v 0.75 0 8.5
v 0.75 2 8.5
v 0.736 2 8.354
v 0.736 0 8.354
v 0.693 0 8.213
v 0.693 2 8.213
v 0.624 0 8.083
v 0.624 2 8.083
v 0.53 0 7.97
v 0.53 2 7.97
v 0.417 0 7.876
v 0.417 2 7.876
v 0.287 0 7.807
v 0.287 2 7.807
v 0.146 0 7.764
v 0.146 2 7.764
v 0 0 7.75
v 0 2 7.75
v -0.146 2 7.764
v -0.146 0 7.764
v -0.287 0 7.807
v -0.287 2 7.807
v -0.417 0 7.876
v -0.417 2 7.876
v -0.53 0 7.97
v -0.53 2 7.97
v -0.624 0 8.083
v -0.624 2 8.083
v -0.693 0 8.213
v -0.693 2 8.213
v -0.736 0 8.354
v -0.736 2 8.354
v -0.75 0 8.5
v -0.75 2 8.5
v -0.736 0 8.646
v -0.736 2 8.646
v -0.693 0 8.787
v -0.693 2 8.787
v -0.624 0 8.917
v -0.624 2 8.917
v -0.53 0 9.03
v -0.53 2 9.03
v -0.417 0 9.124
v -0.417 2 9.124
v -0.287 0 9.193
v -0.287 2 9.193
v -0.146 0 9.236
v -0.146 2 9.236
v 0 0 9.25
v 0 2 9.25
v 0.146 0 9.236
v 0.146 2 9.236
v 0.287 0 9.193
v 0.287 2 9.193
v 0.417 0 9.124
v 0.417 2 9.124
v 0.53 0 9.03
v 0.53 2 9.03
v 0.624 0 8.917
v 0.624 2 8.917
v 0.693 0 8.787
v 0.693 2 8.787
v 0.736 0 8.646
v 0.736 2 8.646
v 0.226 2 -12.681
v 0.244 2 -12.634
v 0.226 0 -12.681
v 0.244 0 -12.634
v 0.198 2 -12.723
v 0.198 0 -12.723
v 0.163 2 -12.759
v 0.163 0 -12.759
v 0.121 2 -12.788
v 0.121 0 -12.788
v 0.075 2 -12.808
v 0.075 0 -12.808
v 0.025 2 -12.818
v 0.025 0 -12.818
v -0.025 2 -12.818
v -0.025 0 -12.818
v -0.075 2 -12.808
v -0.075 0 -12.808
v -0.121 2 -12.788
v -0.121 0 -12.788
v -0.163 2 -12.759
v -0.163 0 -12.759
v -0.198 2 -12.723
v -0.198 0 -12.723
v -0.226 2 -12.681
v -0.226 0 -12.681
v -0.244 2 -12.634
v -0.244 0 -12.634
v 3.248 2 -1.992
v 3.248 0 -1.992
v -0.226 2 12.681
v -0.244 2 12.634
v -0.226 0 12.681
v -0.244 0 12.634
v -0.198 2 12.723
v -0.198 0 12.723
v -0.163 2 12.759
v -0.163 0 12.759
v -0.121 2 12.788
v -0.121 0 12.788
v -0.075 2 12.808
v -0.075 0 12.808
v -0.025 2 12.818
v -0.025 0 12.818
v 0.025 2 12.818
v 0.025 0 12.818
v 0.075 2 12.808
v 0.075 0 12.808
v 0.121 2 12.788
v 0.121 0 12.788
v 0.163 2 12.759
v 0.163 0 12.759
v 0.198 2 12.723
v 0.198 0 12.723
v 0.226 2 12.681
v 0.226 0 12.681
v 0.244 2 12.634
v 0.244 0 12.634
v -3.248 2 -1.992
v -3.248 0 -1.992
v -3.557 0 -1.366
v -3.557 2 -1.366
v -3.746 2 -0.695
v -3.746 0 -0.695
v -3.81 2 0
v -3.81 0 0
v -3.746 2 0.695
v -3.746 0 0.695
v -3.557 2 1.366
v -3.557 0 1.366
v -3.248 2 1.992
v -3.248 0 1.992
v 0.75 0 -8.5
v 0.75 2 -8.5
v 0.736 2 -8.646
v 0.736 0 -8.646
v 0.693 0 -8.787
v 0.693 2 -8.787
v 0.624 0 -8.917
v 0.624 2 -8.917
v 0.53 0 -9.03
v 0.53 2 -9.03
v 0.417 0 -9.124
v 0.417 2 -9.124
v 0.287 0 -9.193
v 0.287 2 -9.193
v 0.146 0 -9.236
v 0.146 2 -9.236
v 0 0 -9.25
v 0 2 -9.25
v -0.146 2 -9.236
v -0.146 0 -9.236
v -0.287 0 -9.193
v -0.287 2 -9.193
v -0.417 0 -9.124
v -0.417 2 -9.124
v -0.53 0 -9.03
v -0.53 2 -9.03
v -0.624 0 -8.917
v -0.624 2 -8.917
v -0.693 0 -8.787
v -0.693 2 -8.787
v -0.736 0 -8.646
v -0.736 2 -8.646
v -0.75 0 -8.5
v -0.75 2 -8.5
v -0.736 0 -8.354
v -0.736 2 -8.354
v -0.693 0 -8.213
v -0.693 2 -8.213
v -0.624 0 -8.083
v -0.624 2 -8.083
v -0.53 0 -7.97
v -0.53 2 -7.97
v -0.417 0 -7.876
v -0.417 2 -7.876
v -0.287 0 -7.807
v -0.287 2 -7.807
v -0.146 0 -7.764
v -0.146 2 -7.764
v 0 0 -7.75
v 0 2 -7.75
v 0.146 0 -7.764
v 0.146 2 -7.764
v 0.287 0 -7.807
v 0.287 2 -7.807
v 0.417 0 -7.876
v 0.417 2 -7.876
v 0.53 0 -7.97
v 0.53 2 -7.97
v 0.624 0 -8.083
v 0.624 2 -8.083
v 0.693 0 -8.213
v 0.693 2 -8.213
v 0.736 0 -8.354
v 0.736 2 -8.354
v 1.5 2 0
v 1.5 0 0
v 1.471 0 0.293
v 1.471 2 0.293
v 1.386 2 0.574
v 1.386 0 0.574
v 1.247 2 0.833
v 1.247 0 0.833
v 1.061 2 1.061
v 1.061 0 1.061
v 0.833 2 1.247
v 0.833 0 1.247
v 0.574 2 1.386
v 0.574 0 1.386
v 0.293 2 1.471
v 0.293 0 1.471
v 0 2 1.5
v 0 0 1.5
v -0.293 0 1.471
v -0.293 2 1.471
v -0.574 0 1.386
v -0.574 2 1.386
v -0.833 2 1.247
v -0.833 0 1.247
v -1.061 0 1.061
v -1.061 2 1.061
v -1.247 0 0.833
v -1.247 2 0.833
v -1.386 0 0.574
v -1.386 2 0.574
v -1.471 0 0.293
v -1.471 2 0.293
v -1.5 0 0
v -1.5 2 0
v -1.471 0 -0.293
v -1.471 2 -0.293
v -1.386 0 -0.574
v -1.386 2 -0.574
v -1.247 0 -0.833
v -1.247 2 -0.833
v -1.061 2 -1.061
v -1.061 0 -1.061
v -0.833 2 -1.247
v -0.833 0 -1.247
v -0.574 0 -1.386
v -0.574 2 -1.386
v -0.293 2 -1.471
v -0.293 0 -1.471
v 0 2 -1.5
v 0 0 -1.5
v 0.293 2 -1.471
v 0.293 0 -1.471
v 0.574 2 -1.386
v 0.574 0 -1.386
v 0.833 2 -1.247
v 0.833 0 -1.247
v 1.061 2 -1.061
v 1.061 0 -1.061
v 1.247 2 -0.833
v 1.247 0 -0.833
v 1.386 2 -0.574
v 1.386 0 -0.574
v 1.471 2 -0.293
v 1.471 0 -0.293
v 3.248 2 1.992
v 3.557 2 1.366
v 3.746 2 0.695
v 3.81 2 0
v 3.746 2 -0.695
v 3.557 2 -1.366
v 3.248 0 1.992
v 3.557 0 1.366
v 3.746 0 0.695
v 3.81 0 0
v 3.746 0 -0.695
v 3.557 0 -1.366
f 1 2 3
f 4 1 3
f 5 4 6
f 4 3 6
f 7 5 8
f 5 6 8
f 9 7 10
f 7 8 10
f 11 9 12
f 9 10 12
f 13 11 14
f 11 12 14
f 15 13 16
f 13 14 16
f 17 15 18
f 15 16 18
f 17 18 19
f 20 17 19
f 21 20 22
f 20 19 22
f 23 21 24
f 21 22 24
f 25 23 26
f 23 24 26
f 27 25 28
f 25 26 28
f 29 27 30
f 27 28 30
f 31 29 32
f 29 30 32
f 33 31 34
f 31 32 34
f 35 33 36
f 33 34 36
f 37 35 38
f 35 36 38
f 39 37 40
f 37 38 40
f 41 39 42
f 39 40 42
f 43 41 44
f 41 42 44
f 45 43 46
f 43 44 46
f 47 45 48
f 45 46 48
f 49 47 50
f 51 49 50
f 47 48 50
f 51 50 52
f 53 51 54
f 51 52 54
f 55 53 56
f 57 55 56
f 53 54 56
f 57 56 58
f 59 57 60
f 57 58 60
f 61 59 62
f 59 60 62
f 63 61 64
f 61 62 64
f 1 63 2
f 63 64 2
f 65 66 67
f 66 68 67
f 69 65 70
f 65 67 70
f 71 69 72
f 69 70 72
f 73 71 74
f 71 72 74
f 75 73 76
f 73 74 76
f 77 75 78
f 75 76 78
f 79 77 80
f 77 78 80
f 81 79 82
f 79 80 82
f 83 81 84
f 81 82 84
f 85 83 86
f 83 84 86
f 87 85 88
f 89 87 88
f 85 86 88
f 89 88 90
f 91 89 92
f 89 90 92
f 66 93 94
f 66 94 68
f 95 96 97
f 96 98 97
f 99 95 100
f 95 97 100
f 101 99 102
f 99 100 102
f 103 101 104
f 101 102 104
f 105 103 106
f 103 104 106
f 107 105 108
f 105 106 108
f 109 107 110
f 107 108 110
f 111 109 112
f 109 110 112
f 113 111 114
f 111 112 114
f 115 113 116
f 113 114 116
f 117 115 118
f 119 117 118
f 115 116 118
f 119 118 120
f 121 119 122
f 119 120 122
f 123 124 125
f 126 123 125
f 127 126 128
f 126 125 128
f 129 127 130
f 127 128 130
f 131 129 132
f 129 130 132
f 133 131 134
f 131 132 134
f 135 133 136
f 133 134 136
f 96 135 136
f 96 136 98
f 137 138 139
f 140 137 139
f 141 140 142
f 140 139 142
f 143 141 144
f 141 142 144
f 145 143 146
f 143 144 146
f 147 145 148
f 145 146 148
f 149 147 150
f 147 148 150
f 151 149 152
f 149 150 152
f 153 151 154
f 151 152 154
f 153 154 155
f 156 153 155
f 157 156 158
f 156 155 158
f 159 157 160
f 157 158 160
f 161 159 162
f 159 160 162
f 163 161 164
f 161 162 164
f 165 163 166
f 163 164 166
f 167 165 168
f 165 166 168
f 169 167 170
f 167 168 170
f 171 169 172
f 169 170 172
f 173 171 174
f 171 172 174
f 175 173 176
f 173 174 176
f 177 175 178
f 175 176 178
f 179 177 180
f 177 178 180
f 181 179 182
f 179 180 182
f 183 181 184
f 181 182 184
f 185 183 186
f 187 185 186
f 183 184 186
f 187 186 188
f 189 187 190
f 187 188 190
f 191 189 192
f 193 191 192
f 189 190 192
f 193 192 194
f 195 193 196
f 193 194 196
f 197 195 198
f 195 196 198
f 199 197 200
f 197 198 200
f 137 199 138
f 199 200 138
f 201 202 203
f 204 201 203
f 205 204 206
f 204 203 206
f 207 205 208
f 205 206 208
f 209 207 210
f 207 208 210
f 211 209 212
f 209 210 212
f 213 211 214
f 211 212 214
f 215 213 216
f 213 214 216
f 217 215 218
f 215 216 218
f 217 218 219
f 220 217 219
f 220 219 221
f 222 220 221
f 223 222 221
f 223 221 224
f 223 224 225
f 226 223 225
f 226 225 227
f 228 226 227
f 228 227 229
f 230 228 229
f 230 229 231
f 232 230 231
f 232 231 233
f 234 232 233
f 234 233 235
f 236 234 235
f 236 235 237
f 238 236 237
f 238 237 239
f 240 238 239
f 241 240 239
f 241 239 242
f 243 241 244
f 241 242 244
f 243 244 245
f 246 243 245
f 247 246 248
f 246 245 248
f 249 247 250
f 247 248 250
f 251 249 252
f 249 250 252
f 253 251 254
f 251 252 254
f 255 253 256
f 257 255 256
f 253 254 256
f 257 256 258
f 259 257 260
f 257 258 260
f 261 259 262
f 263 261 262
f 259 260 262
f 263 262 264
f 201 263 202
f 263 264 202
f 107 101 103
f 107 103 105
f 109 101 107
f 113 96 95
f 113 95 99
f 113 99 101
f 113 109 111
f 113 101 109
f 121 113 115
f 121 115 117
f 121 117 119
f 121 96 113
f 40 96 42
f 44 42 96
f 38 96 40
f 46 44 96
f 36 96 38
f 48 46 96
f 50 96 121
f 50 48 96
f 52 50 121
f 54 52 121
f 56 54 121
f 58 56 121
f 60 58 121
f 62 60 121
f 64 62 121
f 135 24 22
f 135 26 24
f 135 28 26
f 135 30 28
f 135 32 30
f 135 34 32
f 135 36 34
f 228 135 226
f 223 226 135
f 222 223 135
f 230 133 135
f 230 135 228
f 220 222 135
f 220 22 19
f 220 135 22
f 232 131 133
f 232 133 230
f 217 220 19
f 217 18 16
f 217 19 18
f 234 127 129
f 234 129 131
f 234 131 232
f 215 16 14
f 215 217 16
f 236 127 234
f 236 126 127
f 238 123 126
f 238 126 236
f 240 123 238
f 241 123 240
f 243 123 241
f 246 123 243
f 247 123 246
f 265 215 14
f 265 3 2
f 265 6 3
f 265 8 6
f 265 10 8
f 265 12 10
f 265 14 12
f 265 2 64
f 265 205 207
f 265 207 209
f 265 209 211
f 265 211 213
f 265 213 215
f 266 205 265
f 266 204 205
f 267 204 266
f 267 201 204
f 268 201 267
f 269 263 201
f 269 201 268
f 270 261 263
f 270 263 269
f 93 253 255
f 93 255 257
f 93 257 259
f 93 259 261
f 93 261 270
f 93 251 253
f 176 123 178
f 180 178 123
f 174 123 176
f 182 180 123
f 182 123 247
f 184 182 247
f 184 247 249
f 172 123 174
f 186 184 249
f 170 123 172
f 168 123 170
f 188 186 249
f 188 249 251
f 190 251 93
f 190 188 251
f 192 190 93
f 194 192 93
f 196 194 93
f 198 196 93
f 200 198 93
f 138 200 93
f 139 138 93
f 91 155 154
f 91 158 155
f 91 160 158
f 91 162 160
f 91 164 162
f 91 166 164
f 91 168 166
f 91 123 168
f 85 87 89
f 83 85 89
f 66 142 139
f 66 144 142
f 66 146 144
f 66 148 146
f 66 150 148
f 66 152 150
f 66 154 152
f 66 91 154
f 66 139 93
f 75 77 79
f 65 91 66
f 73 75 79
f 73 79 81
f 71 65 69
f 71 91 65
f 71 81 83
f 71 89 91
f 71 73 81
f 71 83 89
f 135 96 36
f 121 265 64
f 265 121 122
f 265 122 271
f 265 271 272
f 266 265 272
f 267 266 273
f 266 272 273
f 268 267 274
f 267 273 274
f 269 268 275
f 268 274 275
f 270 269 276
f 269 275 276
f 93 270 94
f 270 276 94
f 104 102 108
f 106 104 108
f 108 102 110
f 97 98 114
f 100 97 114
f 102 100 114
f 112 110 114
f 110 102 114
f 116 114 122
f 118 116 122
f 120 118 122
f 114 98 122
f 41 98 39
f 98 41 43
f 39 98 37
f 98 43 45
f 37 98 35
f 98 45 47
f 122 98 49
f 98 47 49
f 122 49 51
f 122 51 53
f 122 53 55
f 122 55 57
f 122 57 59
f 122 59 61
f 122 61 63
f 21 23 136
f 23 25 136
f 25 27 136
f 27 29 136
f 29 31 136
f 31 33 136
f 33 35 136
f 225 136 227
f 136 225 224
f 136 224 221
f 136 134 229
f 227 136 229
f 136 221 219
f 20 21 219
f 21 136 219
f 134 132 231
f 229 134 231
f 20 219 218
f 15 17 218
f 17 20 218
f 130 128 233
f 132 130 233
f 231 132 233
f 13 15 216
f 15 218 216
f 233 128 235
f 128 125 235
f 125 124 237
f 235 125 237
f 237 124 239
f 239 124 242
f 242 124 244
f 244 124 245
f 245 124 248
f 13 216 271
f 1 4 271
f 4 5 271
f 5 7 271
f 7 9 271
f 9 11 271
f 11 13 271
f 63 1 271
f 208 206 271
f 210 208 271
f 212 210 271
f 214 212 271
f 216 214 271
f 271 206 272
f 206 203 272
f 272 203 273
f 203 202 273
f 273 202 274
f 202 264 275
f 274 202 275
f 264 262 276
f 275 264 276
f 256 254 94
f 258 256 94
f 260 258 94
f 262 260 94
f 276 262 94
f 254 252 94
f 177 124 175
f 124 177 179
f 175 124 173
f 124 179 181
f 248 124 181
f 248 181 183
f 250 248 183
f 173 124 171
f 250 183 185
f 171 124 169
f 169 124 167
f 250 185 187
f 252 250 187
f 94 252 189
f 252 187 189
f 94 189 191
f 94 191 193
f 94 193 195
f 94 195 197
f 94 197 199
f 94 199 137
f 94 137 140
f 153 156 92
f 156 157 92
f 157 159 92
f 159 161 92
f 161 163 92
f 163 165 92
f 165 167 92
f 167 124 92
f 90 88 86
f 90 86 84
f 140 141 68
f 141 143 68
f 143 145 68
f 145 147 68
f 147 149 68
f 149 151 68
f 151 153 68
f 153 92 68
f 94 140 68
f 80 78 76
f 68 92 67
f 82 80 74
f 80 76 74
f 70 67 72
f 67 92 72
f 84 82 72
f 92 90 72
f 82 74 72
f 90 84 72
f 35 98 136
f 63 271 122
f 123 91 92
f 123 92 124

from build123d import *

# Parameters (mm, degrees)
SKETCH1_R           = 3.81
BOSS_EXTRUDE1_DEPTH = 2
BOSS_EXTRUDE2_DEPTH = 2
FILLET1_R           = 0.254
SKETCH3_R           = 0.75
CUT_EXTRUDE1_DEPTH  = 2
SKETCH4_R           = 1.5
CUT_EXTRUDE2_DEPTH  = 3


with BuildPart() as part:
    # Sketch1 → Boss-Extrude1 (new body)
    with BuildSketch(Plane(origin=(0, 0, 0), x_dir=(1, 0, 0), z_dir=(0, 1, 0))):
        Circle(SKETCH1_R)
    extrude(amount=BOSS_EXTRUDE1_DEPTH)

    # Sketch2 → Boss-Extrude2 (add)
    with BuildSketch(Plane(origin=(0, 2, 0), x_dir=(1, 0, 0), z_dir=(0, 1, 0))):
        with BuildLine():
            Line((0, -13.5), (3.247846855, -1.991881223))
            ThreePointArc((3.247846855, -1.991881223), (0, -3.81), (-3.247846855, -1.991881223))
            Line((-3.247846855, -1.991881223), (0, -13.5))
        make_face()
        with BuildLine():
            ThreePointArc((-3.247846855, 1.991881223), (0, 3.81), (3.247846855, 1.991881223))
            Line((3.247846855, 1.991881223), (0, 13.5))
            Line((0, 13.5), (-3.247846855, 1.991881223))
        make_face()
    extrude(amount=-BOSS_EXTRUDE2_DEPTH)

    # Fillet1
    fillet1_edges = [part.edges().sort_by_distance(p)[0] for p in [
        (0, 1, -13.5),
        (0, 1, 13.5),
    ]]
    fillet(fillet1_edges, radius=FILLET1_R)

    # Sketch3 → Cut-Extrude1 (cut)
    with BuildSketch(Plane(origin=(0, 2, 0), x_dir=(1, 0, 0), z_dir=(0, 1, 0))):
        with Locations((0, 8.5)):
            Circle(SKETCH3_R)
        with Locations((0, -8.5)):
            Circle(SKETCH3_R)
    extrude(amount=-CUT_EXTRUDE1_DEPTH, mode=Mode.SUBTRACT)

    # Sketch4 → Cut-Extrude2 (cut, through all)
    with BuildSketch(Plane.XZ):
        Circle(SKETCH4_R)
    extrude(amount=-CUT_EXTRUDE2_DEPTH, mode=Mode.SUBTRACT)


solid = part.part
